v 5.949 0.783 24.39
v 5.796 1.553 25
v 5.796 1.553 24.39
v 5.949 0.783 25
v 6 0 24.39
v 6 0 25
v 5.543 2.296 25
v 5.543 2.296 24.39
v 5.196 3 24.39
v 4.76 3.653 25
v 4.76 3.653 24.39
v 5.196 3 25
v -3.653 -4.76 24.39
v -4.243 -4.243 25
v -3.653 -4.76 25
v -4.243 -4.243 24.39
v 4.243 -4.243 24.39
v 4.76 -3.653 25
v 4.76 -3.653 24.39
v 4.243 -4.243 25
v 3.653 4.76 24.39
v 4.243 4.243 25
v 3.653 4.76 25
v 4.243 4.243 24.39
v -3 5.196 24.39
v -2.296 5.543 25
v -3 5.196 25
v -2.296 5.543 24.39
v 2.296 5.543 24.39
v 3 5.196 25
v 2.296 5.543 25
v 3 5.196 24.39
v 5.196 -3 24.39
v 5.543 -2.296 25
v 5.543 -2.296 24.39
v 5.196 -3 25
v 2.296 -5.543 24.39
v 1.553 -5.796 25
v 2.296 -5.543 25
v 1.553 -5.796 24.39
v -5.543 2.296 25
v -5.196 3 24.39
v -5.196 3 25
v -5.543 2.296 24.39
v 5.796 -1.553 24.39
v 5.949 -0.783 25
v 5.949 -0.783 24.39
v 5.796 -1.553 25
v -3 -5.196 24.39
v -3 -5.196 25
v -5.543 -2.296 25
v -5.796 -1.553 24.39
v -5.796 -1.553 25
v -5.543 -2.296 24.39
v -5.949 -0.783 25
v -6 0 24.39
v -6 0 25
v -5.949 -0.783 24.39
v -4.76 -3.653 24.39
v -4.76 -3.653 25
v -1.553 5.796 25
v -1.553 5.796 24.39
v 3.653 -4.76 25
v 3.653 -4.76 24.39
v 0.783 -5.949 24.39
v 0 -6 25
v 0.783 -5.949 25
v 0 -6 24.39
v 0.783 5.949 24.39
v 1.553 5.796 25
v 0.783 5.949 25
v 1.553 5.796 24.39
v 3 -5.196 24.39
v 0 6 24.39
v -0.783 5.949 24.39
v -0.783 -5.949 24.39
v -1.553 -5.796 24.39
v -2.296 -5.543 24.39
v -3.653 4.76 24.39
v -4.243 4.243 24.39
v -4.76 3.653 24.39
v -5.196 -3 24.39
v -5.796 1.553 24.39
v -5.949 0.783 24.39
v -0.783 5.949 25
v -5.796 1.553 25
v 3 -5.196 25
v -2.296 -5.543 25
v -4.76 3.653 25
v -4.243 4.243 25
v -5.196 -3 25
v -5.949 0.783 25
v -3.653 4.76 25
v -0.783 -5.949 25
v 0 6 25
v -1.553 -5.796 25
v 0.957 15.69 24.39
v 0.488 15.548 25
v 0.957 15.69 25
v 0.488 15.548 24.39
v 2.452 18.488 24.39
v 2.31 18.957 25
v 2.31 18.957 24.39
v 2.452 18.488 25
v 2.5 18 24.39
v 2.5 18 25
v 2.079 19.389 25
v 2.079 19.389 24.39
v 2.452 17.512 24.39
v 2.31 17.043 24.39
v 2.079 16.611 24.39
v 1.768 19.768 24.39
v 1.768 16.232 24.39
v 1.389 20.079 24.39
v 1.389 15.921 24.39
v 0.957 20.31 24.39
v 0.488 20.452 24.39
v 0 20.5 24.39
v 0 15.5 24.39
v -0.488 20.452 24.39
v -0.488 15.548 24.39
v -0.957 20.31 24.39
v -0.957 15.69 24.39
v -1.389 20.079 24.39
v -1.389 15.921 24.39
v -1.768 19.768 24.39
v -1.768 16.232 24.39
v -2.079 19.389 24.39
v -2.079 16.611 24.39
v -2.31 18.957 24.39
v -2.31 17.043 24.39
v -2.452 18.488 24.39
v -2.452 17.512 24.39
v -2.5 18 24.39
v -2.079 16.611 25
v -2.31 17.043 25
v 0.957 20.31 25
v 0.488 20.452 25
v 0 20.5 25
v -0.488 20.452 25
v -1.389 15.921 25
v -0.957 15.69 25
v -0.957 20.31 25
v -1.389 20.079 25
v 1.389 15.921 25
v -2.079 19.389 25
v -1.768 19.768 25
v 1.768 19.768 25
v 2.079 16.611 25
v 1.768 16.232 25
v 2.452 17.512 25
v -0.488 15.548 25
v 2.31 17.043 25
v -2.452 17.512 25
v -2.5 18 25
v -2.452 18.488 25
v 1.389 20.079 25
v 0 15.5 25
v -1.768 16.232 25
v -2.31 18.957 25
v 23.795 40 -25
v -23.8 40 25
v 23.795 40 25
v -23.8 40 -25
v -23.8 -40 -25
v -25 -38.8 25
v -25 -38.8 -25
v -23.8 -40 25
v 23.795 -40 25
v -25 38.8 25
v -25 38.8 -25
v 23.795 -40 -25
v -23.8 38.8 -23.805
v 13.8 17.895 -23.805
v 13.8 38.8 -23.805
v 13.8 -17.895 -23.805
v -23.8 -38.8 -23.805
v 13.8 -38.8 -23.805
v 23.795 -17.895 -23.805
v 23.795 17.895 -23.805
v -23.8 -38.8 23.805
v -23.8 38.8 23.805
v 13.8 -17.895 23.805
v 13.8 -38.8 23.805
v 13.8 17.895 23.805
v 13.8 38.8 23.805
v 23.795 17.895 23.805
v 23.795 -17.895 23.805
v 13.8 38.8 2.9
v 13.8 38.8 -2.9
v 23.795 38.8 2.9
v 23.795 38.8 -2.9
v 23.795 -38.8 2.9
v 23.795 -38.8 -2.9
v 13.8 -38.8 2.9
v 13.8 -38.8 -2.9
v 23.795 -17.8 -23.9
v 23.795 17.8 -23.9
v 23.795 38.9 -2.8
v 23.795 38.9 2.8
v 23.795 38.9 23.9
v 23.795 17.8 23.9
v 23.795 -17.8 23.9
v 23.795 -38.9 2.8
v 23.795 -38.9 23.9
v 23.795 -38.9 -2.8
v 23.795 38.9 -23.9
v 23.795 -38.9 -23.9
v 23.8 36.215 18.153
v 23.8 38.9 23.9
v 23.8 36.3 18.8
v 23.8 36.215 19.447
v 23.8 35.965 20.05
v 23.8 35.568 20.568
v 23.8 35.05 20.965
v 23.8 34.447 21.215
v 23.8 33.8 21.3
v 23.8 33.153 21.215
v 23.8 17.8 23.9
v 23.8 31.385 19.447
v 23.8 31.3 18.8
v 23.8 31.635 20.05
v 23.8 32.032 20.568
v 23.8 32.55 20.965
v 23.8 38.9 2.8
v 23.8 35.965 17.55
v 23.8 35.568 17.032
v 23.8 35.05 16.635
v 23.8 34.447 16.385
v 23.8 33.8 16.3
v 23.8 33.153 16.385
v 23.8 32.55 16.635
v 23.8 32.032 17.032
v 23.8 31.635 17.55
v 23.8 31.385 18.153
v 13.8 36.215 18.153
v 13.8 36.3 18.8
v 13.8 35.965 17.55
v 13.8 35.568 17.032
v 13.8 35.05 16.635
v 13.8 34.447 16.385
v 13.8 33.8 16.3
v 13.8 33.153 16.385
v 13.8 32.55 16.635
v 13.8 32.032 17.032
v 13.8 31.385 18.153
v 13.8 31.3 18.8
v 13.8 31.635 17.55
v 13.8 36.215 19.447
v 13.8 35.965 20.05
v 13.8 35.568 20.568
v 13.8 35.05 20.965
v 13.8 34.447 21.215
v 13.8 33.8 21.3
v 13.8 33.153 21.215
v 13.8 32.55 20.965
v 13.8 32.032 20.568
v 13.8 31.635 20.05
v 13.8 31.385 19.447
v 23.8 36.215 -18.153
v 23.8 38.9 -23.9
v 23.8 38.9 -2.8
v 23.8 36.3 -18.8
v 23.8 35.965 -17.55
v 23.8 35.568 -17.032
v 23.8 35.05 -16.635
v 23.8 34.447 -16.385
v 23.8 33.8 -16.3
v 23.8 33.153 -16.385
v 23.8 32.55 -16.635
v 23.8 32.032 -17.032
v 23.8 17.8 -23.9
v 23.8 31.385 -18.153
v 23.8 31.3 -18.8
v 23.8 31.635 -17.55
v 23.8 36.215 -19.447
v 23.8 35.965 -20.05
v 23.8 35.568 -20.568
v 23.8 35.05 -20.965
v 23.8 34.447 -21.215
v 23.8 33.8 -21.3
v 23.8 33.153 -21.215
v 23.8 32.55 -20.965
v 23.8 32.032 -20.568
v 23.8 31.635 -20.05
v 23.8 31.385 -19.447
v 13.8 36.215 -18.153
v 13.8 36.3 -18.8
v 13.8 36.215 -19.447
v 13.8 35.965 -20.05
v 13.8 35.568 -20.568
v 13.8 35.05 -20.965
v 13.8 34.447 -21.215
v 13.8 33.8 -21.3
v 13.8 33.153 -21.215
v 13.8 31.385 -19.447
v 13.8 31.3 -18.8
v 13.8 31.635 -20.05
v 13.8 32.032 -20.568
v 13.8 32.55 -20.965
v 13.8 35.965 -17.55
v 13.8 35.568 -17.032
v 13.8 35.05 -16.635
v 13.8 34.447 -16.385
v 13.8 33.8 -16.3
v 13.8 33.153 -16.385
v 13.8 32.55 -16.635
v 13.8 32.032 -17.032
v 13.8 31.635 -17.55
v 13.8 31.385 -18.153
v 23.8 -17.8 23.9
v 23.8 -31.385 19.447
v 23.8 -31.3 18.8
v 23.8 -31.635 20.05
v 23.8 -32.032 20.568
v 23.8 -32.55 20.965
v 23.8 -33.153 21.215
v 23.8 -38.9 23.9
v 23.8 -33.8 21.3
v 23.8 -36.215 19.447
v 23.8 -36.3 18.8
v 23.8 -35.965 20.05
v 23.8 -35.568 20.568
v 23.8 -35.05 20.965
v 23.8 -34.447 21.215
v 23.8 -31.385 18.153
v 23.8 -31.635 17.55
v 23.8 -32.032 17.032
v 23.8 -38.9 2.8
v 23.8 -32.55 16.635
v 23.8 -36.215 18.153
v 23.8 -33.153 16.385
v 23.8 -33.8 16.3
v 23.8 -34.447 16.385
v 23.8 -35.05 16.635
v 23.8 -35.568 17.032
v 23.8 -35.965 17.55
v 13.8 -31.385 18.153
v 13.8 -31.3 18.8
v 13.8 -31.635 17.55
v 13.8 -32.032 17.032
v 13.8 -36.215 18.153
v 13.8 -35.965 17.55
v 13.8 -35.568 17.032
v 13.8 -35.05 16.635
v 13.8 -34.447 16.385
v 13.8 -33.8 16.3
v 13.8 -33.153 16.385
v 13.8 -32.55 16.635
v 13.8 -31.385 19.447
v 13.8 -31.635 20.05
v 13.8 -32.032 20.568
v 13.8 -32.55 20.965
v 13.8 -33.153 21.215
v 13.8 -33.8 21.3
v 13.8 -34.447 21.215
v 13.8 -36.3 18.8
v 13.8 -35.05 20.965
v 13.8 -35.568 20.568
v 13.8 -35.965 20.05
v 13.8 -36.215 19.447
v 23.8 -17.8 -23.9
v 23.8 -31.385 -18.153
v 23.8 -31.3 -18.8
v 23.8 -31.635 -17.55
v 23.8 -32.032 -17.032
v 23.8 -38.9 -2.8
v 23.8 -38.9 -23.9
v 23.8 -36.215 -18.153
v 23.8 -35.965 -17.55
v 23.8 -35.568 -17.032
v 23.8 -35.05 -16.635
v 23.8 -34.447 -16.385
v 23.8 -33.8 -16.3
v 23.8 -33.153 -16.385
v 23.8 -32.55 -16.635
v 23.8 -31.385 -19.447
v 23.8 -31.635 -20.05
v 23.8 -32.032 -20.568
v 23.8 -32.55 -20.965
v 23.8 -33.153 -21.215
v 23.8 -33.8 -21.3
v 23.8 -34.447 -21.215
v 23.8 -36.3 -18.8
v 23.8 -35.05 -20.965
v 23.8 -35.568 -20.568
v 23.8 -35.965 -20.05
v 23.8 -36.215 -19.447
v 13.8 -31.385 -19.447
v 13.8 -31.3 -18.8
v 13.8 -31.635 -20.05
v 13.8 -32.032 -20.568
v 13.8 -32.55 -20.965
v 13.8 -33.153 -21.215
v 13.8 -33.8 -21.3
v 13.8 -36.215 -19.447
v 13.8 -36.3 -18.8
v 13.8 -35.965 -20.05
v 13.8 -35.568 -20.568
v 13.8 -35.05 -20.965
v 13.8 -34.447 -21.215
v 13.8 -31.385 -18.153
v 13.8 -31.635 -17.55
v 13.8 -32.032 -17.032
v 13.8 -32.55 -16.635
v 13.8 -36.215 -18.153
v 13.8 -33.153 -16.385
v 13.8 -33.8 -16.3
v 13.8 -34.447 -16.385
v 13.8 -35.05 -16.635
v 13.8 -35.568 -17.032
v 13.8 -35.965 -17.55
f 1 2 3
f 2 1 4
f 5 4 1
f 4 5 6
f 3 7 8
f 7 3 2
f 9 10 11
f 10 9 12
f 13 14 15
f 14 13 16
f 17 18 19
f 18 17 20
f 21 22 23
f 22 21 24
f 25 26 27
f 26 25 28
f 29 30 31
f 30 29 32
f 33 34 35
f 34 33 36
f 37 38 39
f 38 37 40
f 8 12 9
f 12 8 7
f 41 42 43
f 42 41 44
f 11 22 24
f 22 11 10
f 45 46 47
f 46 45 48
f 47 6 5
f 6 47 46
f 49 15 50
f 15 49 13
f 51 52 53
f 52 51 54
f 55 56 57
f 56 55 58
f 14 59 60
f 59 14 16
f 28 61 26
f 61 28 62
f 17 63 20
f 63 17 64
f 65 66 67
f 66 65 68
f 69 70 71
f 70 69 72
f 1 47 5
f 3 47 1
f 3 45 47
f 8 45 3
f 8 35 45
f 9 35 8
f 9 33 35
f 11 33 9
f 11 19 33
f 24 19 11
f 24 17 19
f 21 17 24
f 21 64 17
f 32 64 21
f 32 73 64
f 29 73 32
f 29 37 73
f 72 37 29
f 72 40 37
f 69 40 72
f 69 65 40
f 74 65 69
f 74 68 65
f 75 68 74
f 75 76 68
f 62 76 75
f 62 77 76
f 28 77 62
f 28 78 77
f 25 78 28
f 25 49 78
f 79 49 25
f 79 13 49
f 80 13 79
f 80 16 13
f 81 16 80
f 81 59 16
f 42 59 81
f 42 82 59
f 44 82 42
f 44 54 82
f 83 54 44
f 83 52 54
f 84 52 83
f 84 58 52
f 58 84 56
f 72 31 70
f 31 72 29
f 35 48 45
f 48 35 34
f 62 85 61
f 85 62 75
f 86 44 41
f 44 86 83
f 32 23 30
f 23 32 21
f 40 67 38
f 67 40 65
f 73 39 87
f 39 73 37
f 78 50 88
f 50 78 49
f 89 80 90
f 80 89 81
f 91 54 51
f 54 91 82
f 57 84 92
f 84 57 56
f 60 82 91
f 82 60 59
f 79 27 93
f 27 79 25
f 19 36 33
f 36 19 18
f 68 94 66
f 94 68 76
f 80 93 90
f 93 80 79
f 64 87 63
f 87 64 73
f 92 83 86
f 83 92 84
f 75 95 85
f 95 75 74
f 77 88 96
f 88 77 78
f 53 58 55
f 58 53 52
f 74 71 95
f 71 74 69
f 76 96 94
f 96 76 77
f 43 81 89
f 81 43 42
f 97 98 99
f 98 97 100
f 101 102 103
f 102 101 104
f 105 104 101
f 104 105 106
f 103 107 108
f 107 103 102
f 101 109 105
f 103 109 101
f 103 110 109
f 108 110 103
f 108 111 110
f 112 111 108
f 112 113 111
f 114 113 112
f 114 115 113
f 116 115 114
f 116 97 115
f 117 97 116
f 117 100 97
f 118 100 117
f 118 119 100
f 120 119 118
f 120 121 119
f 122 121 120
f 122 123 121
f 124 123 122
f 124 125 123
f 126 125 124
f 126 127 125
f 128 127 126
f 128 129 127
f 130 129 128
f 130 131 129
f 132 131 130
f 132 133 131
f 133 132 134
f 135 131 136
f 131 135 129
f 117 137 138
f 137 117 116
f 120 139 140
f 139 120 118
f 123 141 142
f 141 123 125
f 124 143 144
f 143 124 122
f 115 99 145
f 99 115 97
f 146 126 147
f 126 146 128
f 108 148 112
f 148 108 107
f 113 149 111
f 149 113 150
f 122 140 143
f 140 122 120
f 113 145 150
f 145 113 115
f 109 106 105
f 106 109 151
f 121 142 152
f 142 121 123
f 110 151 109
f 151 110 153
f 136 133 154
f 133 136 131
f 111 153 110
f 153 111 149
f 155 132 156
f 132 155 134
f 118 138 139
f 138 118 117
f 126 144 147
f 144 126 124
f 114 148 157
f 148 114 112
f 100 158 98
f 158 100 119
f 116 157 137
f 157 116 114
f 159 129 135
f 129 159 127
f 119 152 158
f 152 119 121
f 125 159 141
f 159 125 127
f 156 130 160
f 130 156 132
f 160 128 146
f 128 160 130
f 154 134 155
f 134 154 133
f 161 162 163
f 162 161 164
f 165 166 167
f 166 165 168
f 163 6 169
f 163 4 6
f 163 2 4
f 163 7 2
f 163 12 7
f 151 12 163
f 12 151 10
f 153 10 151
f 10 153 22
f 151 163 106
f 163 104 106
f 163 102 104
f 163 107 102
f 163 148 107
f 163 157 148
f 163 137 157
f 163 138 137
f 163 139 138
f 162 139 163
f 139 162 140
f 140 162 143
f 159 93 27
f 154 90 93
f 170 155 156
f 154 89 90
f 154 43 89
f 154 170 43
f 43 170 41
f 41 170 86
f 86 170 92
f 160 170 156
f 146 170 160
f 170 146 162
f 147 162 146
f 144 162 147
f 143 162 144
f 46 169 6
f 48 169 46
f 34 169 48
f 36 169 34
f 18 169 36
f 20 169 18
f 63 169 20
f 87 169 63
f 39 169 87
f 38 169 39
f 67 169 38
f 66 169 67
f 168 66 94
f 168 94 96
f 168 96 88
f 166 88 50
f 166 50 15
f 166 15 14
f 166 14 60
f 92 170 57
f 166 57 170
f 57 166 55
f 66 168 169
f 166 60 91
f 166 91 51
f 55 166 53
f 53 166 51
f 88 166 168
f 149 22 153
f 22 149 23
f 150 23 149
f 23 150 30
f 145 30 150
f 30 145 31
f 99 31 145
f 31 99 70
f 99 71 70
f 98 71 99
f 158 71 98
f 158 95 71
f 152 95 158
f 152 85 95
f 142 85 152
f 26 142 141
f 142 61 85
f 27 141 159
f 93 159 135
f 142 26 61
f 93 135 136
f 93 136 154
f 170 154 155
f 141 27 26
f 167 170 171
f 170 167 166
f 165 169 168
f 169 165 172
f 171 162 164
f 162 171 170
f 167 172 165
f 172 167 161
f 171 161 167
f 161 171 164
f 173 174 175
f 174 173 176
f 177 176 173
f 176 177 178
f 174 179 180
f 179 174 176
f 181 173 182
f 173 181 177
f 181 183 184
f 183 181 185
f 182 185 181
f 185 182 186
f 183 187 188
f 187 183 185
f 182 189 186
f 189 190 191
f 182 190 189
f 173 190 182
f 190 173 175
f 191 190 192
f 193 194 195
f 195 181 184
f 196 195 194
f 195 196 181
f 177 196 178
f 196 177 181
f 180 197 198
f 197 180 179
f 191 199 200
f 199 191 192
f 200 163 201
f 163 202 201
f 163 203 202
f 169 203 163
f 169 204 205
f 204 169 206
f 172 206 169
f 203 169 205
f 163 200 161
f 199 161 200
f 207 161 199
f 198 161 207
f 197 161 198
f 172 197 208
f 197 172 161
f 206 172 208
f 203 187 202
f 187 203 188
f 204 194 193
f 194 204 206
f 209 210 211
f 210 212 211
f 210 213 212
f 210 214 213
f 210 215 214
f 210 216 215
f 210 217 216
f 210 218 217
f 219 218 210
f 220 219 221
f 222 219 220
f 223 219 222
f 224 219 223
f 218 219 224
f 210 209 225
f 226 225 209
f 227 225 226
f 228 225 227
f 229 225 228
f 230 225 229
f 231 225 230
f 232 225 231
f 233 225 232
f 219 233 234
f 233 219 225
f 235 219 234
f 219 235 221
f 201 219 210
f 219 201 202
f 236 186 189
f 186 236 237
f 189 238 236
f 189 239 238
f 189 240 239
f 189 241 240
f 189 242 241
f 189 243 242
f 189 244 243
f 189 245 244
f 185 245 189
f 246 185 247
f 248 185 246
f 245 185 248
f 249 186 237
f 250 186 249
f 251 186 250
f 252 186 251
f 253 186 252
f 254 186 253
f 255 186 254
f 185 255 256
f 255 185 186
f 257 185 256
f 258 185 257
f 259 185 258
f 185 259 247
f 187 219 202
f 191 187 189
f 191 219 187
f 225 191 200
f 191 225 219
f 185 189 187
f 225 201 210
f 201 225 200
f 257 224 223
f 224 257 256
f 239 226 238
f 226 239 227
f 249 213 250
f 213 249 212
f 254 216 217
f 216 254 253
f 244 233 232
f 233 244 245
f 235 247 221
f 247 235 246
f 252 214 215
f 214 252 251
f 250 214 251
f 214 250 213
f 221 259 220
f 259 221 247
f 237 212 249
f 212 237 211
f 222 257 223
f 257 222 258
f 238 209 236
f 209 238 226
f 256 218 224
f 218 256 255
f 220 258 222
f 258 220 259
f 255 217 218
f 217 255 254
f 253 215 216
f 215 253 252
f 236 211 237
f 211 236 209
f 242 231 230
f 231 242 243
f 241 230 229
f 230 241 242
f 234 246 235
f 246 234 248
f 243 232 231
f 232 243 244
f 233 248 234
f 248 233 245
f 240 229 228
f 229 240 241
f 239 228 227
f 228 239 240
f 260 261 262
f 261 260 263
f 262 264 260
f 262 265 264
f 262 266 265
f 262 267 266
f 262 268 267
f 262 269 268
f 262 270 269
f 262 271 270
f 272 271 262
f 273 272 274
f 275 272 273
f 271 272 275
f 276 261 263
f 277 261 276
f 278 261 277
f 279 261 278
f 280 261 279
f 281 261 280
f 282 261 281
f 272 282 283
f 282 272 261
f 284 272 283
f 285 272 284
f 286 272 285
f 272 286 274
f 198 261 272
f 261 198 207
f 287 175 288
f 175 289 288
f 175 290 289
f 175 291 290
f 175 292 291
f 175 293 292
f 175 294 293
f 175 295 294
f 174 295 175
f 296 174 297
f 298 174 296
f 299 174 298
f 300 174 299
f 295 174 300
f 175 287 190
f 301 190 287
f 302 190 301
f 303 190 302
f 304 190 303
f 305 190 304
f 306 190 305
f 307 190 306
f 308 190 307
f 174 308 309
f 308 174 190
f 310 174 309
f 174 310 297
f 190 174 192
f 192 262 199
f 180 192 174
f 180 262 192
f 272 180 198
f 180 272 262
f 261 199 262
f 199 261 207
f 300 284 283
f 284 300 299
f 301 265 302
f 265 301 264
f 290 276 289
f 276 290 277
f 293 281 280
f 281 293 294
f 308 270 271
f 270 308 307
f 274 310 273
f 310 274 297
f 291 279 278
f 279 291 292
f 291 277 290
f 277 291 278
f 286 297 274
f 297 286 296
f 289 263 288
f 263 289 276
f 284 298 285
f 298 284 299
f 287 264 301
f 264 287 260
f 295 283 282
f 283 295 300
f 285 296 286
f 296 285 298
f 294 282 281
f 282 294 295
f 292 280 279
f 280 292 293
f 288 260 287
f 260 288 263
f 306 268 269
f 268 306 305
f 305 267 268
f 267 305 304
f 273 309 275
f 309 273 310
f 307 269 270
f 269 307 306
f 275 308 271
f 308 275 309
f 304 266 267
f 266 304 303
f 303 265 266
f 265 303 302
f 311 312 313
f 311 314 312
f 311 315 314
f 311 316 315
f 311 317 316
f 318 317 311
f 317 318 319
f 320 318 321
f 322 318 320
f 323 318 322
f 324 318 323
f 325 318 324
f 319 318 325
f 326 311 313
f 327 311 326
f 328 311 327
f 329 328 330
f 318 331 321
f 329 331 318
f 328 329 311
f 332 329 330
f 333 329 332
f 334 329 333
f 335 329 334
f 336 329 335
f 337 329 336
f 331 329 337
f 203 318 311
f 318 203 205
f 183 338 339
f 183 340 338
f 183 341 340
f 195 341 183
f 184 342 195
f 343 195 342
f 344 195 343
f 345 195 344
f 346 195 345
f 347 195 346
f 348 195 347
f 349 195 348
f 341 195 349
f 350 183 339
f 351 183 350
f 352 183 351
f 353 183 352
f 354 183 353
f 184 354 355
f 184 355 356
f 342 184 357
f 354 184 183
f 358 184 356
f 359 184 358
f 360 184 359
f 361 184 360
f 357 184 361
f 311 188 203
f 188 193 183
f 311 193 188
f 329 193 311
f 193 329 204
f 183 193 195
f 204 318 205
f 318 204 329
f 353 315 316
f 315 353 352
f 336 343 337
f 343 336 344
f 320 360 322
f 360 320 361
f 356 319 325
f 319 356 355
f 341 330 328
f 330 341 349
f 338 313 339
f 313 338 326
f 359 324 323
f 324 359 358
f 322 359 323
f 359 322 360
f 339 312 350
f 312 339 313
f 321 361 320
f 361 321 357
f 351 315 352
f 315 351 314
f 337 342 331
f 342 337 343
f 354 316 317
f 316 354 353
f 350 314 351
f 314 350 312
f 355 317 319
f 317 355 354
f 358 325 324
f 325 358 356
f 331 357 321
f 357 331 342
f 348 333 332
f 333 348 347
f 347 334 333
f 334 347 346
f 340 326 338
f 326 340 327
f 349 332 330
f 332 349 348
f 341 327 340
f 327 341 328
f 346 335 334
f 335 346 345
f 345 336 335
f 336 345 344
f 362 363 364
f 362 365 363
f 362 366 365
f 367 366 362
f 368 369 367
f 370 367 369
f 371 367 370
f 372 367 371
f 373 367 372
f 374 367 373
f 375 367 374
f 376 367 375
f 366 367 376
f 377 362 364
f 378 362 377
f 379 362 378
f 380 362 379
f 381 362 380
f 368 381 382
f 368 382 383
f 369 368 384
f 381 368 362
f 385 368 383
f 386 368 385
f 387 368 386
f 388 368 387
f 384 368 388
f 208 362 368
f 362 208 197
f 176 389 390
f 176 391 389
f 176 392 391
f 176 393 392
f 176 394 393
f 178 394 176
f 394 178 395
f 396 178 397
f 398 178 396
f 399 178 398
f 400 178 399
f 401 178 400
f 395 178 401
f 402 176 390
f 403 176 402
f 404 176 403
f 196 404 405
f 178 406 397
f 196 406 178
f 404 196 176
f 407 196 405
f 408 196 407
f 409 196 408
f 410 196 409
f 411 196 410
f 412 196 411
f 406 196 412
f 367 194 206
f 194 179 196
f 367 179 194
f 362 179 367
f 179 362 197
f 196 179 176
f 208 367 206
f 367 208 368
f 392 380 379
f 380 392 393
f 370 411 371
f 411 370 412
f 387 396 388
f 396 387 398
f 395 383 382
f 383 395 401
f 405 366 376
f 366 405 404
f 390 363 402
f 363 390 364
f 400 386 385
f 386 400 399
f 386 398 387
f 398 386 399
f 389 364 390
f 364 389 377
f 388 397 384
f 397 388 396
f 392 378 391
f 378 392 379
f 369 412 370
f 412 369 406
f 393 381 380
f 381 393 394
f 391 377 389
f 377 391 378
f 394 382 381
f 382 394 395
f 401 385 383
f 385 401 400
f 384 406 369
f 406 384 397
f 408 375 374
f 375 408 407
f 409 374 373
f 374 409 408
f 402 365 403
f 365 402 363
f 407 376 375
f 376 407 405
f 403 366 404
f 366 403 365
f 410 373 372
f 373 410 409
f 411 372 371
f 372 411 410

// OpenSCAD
/* Abrepuertas — Caja para electrónica
 * 50 mm × 80 mm × 50 mm
 * Frente = plano XY, profundidad = eje Z
 * Apertura en la pared derecha (x = ancho/2).
 * Pestañas con tornillos en las 4 esquinas de la pared derecha.
 * Agujeros de timbre y LED en la pared frontal (z = fondo/2).
 */

// --- parámetros (en décimas de mm) ----------------------------------
grosor_linea  = 4;    // 0.4 mm
num_paredes   = 3;    // número de perímetros
bisel         = 12;   // 1.2 mm (chaflán 45° en esquinas verticales)

ancho         = 500;  // 50.0 mm
alto          = 800;  // 80.0 mm
fondo         = 500;  // 50.0 mm

diam_timbre   = 120;  // 12.0 mm
pos_x_timbre  = 0;
pos_y_timbre  = 0;

diam_led      = 50;   // 5.0 mm
pos_x_led     = 0;
pos_y_led     = 180;
usar_led      = 1;

diam_tornillo = 50;   // 5.0 mm
dist_tornillo = 50;   // 5.0 mm

largo_pestanna = 210; // 21.0 mm
prof_pestanna  = 100; // 10.0 mm
solape         = 1;    // 0.1 mm

// --- conversión a mm -------------------------------------------------
_mm = 0.1;
_w = num_paredes * grosor_linea * _mm;
_b = bisel * _mm;
_wid = ancho * _mm;
_h = alto * _mm;
_d = fondo * _mm;

_dt = diam_timbre * _mm;
_pxt = pos_x_timbre * _mm;
_pyt = pos_y_timbre * _mm;
_dl = diam_led * _mm;
_pxl = pos_x_led * _mm;
_pyl = pos_y_led * _mm;
_ul = usar_led;

_dh = diam_tornillo * _mm;
_ho = dist_tornillo * _mm;
_tl = largo_pestanna * _mm;
_td = prof_pestanna * _mm;
_so = solape * _mm;

// --- helpers ----------------------------------------------------------
module chamfered_square(sx, sy, c) {
    if (c > 0.001) {
        x = sx/2;
        y = sy/2;
        polygon([
            [ x - c,  y], [ x,  y - c],
            [ x, -y + c], [ x - c, -y],
            [-x + c, -y], [-x, -y + c],
            [-x,  y - c], [-x + c,  y]
        ]);
    } else {
        square([sx, sy], center = true);
    }
}

module box_body() {
    linear_extrude(height = _d, center = true)
        chamfered_square(_wid, _h, _b);
}

module cavity() {
    linear_extrude(height = _d - 2*_w + 0.01, center = true)
        chamfered_square(_wid - 2*_w, _h - 2*_w, _b - _w);
}

module right_side_cut() {
    translate([_wid/2 - _w/2, 0, 0])
        cube([_w + 0.01, _h + 1, _d + 1], center = true);
}

// --- pestañas triangulares (pared derecha) ---------------------------
module screw_tab() {
    difference() {
        rotate([0, -90, 0])
            linear_extrude(height = _td)
                polygon(points = [[_so, _so], [-_tl, _so], [_so, -_tl]]);
        translate([0, -_ho, -_ho])
            rotate([0, -90, 0])
                cylinder(h = _td + 0.02, d = _dh, $fn = 24);
    }
}

module pestannas() {
    x0 = _wid/2 - _w;
    for (sy = [1, -1], sz = [1, -1])
        translate([x0, sy * (_h/2 - _w), sz * (_d/2 - _w)])
            scale([1, sy, sz])
                screw_tab();
}

// --- agujeros frontales (z = fondo/2) --------------------------------
module front_cutouts() {
    translate([_pxt, _pyt, _d/2])
        cylinder(h = _w + 0.02, d = _dt, center = true, $fn = 48);
    if (_ul)
        translate([_pxl, _pyl, _d/2])
            cylinder(h = _w + 0.02, d = _dl, center = true, $fn = 32);
}

// --- ensamblado -------------------------------------------------------
union() {
    difference() {
        box_body();
        cavity();
        right_side_cut();
        front_cutouts();
    }
    pestannas();
}
